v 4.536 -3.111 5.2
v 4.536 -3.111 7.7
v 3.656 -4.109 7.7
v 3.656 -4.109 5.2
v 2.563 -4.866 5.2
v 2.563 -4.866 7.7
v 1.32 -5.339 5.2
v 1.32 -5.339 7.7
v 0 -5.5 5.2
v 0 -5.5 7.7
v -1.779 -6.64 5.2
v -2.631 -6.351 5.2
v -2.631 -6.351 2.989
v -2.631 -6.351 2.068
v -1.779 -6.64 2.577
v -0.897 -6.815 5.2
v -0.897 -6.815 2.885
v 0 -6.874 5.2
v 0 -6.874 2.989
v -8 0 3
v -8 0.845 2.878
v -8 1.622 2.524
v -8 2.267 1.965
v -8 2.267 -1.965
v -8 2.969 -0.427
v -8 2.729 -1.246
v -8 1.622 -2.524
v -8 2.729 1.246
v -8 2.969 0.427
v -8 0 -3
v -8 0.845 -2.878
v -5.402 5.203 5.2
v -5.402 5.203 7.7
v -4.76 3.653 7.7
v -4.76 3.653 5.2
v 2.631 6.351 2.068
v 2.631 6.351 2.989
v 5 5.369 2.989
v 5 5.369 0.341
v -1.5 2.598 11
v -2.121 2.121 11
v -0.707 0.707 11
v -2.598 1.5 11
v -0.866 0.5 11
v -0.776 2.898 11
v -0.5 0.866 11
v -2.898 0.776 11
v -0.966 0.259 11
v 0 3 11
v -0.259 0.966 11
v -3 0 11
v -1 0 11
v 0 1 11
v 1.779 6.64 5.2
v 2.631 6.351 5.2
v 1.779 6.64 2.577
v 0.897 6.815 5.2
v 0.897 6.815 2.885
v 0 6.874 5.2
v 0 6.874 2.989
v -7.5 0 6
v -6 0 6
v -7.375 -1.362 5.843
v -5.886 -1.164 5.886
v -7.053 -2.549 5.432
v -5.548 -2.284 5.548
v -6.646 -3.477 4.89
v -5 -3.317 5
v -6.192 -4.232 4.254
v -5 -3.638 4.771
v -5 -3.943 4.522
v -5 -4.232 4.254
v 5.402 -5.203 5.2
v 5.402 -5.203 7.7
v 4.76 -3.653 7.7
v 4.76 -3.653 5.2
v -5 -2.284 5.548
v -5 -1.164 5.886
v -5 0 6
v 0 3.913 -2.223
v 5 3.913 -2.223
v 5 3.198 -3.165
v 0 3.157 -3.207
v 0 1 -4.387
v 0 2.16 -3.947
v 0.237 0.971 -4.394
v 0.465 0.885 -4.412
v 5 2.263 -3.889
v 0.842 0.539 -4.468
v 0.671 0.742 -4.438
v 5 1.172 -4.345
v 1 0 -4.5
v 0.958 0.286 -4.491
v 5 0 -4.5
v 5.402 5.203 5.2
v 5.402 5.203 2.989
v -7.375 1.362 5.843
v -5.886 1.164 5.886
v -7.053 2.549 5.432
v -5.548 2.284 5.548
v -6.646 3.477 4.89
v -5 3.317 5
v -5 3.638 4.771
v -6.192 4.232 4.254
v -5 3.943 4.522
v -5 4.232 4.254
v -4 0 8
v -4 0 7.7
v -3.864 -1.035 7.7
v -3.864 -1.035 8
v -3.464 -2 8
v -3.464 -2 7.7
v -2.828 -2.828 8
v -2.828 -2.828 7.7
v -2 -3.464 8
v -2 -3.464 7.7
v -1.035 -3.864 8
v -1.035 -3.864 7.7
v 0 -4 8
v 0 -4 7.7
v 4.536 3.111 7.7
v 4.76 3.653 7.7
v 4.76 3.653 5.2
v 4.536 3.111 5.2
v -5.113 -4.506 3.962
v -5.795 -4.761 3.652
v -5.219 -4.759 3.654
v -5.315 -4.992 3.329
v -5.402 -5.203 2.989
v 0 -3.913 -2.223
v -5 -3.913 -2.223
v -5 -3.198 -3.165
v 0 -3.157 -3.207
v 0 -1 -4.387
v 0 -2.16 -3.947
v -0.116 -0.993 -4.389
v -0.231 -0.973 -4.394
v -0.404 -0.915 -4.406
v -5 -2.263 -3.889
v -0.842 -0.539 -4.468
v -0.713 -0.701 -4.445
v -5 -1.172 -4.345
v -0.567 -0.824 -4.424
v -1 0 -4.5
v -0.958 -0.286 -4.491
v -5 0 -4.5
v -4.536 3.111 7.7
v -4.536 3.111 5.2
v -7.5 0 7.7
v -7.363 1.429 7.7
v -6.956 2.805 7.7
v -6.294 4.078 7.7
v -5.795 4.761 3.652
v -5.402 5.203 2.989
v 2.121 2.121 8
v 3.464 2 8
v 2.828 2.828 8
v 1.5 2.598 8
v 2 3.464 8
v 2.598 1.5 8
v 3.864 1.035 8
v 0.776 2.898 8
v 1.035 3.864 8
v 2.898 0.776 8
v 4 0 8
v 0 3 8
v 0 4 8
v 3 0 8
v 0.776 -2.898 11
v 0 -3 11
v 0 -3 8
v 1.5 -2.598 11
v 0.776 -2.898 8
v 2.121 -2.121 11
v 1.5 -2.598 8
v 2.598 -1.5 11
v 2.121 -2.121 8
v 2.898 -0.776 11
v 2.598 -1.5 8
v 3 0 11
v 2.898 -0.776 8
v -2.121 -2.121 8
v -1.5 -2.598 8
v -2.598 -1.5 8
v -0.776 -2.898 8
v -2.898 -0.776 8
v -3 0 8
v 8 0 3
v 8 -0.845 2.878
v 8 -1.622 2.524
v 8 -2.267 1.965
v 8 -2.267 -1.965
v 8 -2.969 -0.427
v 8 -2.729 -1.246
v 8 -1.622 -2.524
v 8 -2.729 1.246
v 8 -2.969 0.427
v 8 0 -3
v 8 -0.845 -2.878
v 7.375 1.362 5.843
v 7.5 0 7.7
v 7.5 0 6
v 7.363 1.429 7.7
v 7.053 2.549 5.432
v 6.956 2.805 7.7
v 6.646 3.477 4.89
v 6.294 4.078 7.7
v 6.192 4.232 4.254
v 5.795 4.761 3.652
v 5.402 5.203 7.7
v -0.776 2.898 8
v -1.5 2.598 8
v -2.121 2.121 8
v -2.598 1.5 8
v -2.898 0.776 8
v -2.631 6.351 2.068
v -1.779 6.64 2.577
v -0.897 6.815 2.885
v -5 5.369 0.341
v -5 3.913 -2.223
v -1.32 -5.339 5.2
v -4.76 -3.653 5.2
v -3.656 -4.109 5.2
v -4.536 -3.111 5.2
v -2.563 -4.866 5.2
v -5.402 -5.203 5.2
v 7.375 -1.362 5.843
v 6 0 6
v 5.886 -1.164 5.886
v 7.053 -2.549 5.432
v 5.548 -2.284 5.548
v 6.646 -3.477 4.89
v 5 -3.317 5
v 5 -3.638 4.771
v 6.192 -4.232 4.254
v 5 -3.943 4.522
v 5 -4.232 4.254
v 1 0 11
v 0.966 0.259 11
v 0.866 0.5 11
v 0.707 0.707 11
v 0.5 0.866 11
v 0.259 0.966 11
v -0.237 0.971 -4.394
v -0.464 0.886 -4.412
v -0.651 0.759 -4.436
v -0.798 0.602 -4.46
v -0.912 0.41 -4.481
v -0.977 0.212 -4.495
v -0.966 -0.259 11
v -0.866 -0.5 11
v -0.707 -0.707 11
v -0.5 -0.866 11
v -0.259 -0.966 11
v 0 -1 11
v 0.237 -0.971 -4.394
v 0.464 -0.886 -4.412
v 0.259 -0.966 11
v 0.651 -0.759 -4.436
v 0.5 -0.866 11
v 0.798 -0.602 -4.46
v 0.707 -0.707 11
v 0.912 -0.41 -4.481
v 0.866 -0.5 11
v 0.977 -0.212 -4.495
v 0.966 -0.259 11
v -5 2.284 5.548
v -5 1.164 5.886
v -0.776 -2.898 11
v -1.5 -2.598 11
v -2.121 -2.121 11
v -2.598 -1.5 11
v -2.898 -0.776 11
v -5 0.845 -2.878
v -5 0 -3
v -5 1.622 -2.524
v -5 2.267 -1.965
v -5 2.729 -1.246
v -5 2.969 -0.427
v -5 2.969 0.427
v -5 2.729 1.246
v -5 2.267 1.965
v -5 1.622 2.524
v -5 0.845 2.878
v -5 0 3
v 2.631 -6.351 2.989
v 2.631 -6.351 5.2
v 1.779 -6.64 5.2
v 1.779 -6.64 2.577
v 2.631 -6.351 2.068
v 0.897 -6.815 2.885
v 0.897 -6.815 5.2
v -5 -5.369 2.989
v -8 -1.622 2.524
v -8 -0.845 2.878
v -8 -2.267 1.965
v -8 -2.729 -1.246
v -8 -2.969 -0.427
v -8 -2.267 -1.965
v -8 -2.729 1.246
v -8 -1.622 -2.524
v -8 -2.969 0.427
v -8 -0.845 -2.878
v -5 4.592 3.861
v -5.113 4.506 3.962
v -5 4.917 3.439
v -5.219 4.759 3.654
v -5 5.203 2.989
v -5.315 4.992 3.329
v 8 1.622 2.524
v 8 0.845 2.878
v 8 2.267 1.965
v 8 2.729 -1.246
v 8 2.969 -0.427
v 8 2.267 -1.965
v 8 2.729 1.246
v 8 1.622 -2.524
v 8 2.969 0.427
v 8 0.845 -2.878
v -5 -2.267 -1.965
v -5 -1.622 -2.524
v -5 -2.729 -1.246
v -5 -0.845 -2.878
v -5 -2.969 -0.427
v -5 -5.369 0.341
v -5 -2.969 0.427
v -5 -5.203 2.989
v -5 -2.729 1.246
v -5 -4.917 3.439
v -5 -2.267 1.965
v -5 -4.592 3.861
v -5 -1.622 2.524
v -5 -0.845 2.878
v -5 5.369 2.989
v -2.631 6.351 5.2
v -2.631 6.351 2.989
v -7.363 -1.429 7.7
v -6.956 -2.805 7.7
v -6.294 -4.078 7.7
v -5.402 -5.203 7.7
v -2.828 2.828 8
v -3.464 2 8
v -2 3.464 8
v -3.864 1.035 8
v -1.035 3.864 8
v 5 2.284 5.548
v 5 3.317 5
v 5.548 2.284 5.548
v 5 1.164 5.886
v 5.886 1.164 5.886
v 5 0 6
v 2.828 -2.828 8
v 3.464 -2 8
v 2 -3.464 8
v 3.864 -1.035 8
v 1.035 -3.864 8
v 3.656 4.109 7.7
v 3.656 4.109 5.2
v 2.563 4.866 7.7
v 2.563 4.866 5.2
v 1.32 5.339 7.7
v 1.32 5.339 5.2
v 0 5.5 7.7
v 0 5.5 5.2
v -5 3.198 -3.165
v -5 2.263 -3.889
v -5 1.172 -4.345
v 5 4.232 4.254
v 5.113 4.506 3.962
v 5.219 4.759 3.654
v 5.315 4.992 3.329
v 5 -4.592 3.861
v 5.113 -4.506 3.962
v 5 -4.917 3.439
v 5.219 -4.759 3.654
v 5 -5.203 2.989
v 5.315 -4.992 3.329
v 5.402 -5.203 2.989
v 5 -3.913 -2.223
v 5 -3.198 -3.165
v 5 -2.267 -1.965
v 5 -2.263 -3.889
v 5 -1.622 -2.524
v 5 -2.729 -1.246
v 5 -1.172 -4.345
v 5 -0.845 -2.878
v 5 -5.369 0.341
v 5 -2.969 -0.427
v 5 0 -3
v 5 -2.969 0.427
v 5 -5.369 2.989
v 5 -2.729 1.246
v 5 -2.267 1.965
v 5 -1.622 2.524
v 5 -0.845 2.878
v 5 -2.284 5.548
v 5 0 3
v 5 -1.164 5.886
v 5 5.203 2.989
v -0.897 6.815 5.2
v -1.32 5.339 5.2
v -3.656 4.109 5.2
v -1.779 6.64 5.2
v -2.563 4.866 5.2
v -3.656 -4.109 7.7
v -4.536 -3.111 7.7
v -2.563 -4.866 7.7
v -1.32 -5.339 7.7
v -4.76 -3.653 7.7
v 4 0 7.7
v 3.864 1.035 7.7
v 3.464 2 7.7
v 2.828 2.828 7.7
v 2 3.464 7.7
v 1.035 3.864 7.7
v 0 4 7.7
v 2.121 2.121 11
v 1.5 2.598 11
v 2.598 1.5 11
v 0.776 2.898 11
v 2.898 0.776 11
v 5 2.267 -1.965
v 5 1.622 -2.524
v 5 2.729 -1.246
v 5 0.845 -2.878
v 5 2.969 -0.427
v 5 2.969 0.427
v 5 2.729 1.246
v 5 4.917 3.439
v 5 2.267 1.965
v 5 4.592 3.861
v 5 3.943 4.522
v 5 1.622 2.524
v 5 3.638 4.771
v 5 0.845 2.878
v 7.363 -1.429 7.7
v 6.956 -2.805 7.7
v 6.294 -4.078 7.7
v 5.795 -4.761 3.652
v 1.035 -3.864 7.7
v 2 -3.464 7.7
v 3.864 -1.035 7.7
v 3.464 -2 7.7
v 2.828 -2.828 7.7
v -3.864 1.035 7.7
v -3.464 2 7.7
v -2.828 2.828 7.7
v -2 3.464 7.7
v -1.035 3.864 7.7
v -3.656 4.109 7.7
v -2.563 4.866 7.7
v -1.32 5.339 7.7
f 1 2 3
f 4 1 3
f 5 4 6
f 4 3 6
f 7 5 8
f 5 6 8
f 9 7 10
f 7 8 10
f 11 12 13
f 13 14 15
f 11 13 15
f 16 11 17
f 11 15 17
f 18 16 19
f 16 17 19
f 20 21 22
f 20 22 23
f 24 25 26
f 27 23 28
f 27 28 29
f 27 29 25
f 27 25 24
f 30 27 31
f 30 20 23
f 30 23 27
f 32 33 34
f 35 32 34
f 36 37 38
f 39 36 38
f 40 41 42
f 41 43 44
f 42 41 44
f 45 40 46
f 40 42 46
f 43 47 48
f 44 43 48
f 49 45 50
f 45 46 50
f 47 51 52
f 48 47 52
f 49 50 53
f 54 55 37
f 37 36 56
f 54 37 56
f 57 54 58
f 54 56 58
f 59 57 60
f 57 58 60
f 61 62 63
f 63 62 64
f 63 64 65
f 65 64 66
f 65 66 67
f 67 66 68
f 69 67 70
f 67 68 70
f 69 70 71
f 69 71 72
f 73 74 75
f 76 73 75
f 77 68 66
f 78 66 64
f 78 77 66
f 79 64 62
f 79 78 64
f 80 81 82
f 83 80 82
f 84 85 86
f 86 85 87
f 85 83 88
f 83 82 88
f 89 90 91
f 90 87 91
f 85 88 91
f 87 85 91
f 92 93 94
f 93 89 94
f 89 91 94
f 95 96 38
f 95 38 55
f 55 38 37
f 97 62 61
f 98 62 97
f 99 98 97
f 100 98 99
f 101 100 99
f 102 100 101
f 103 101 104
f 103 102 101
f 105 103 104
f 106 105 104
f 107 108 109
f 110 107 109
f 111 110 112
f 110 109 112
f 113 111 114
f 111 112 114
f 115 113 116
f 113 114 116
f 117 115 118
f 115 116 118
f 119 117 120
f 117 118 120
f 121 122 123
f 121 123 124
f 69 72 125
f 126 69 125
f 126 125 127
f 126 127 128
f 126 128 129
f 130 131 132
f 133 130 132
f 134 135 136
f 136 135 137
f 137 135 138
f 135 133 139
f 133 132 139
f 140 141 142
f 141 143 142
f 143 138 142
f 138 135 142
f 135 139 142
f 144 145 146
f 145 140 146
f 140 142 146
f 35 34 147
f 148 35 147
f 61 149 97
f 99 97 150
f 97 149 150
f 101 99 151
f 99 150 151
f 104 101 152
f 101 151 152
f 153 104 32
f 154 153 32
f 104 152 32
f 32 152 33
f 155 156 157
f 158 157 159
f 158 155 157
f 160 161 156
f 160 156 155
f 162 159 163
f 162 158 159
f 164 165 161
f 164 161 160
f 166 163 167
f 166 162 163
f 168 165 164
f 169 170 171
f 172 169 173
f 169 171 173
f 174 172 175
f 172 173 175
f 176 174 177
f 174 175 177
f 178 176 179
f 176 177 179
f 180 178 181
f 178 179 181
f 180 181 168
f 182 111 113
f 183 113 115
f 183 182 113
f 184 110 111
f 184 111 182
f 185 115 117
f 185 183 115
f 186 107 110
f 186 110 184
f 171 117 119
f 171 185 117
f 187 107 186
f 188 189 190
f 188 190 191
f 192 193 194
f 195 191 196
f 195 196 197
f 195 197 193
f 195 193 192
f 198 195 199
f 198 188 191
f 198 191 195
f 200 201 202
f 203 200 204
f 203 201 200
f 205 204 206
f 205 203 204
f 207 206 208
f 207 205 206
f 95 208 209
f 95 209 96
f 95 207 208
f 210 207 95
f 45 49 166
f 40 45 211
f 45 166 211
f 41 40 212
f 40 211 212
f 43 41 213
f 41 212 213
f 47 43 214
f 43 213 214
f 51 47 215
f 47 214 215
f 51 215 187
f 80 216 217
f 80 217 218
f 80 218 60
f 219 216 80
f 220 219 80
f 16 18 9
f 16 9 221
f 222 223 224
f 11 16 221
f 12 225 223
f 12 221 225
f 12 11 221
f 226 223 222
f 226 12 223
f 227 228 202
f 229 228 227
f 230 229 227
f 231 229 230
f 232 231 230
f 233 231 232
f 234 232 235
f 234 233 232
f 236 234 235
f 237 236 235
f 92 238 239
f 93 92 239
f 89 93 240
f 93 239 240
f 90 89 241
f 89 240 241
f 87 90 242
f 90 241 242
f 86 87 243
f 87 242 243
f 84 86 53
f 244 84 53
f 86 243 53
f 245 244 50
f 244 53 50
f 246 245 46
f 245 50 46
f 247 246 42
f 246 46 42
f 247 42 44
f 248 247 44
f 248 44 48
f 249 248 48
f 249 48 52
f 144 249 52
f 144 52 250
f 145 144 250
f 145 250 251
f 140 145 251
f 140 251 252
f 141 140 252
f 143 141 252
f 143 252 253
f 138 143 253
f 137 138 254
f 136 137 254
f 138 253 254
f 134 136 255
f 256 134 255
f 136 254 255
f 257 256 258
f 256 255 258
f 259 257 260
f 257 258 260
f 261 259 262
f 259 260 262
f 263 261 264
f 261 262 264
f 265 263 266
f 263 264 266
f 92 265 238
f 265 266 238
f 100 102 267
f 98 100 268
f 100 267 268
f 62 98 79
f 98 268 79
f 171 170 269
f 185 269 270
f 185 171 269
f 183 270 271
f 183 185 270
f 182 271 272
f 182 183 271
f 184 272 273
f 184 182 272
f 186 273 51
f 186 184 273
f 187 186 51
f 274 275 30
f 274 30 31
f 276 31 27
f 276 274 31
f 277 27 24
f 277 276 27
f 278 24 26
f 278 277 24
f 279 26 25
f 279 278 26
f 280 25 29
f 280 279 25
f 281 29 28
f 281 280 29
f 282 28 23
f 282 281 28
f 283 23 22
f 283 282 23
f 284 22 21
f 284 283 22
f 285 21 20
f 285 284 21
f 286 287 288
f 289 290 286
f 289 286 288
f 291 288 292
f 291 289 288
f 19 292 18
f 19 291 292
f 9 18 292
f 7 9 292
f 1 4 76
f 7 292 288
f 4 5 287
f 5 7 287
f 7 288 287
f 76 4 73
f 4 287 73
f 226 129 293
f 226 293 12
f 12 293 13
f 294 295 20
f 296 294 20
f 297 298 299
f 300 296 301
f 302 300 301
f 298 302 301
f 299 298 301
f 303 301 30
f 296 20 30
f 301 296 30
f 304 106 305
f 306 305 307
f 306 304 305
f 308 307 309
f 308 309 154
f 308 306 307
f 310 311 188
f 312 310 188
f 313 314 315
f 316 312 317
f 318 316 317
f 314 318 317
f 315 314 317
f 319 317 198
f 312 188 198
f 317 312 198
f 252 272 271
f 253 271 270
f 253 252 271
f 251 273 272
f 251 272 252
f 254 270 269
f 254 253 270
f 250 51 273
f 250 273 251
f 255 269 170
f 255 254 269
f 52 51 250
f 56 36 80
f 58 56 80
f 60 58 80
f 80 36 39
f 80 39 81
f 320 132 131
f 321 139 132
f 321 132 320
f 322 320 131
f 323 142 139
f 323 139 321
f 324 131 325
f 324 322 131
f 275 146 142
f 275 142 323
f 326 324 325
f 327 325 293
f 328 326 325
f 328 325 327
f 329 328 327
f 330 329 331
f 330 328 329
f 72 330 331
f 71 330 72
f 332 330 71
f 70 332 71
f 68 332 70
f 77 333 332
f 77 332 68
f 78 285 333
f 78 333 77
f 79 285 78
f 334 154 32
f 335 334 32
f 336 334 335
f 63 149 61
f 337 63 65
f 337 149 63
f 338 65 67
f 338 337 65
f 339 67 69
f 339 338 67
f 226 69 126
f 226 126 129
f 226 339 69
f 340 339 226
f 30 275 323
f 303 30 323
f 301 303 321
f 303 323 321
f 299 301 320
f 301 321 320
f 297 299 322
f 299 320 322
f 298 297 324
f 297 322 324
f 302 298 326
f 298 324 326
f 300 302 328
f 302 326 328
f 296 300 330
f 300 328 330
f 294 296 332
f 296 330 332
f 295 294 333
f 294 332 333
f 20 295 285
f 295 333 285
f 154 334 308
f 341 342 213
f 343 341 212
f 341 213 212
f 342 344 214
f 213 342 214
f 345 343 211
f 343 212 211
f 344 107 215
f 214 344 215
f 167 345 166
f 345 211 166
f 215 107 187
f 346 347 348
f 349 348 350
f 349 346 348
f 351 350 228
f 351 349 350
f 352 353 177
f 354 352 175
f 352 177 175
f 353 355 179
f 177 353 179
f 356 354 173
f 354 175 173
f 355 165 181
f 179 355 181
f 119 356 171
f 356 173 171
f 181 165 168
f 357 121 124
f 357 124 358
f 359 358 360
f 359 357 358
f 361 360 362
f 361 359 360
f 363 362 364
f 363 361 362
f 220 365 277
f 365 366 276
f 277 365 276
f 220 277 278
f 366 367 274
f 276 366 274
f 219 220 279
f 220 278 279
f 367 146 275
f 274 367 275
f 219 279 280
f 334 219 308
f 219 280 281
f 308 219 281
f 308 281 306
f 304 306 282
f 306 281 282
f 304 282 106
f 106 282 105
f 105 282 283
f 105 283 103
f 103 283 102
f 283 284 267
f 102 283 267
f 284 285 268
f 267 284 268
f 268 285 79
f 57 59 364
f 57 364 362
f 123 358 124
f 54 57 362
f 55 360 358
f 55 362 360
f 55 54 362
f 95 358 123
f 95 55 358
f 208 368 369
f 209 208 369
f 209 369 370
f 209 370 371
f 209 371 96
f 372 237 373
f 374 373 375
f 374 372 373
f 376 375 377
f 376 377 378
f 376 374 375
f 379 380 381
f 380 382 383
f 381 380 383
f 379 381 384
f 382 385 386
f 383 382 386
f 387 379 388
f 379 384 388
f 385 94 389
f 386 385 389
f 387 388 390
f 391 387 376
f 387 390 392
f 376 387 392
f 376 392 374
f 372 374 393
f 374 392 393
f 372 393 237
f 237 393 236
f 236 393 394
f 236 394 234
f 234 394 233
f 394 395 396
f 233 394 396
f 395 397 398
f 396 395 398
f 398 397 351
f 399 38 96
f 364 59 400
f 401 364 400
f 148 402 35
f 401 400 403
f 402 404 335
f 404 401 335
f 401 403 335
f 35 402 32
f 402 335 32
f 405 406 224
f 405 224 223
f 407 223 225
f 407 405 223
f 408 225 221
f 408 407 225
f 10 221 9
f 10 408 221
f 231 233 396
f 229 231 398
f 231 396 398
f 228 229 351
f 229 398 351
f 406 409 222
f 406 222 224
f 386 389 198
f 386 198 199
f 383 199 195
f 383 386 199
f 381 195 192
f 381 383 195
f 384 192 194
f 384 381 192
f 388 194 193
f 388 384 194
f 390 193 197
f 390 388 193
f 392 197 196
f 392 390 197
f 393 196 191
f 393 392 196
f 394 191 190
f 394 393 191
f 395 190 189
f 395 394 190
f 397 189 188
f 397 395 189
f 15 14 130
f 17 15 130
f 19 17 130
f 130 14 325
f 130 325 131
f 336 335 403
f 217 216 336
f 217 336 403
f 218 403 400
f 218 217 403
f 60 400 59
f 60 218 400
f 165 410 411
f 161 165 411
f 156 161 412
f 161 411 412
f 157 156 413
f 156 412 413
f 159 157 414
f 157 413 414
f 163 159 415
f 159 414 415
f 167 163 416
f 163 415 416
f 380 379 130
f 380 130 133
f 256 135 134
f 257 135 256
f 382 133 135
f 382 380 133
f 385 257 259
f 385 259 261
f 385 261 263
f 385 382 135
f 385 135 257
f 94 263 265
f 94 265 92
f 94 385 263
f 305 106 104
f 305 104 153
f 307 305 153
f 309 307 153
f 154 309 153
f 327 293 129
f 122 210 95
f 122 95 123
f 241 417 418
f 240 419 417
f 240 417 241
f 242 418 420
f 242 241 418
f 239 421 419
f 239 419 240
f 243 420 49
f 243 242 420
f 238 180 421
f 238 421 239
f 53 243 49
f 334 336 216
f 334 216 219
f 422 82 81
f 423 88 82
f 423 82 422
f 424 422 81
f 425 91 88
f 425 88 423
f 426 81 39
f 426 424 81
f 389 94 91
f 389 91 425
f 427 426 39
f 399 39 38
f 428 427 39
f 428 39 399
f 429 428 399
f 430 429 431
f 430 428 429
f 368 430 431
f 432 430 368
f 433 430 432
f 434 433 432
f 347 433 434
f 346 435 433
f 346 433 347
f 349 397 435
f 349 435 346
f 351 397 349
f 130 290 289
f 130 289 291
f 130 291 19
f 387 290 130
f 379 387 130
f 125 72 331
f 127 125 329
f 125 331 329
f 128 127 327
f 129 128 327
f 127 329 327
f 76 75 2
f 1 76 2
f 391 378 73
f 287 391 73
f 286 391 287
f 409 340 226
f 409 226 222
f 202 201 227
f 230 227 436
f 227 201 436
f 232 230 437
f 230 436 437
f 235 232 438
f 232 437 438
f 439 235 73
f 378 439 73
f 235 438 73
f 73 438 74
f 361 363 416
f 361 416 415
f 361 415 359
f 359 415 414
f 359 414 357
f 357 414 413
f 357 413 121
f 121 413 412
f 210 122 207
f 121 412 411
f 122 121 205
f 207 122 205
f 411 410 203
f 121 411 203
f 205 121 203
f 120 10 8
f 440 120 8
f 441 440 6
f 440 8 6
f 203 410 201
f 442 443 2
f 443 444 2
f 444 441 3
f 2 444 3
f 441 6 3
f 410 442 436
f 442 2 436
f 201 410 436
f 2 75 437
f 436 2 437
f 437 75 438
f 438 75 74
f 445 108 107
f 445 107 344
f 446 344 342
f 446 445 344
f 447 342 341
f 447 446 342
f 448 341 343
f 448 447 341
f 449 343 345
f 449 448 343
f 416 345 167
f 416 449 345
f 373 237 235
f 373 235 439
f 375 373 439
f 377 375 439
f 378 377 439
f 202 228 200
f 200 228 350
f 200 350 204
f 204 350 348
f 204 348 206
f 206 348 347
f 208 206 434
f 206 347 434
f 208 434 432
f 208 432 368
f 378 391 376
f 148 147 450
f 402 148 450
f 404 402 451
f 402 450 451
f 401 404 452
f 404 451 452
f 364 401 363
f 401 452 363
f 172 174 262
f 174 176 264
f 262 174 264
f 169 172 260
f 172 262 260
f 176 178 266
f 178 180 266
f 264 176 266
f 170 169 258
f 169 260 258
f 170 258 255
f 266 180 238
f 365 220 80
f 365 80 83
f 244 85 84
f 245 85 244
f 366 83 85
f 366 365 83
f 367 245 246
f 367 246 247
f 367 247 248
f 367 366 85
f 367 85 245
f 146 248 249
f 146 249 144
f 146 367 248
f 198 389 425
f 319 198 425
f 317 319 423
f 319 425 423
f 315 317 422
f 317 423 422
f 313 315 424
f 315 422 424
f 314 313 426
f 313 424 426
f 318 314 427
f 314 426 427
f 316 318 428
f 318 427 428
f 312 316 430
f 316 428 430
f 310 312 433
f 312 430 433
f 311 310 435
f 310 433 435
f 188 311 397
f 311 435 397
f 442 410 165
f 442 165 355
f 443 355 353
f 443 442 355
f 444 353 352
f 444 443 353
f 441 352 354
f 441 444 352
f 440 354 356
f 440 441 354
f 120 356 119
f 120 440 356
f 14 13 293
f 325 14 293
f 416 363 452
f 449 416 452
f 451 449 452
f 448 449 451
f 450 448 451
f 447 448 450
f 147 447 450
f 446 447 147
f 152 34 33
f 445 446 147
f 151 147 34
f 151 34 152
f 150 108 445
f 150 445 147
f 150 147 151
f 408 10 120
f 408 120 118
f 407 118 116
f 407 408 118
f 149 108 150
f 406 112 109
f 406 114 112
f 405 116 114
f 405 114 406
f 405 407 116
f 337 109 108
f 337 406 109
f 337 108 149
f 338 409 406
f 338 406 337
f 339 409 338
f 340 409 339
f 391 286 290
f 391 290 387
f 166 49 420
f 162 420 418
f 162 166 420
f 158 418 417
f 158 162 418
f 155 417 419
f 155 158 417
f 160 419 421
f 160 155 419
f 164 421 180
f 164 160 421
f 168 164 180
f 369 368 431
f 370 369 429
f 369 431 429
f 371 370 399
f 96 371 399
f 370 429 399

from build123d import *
from build123d.topology import SkipClean

# Parameters (mm, degrees)
SKETCH1_R                = 6
BOSS_EXTRUDE1_DEPTH      = 11
SKETCH2_R                = 6
BOSS_EXTRUDE2_DEPTH      = 8
CUT_EXTRUDE1_DEPTH       = 10
CUT_EXTRUDE1_DEPTH_BACK  = 3
SKETCH3_R                = 6
SKETCH3_R_2              = 3
SKETCH5_W                = 8.868099488
SKETCH5_H                = 25.092164851
CUT_EXTRUDE3_DEPTH       = 20.723082923
CUT_EXTRUDE2_START       = -3.3
CUT_EXTRUDE2_DEPTH       = 3.3
CUT_EXTRUDE5_DEPTH       = 2.5
BOSS_EXTRUDE3_REACH      = 18.961
BOSS_EXTRUDE3_END_RADIUS = 6
BOSS_EXTRUDE4_START      = -2.211146
BOSS_EXTRUDE4_DEPTH      = 2.211146
SKETCH10_R               = 3
CUT_EXTRUDE6_DEPTH       = 19.364367672
SKETCH12_R               = 4
SKETCH12_R_2             = 3
BOSS_EXTRUDE5_DEPTH      = 0.3
BOSS_EXTRUDE6_START      = -5
BOSS_EXTRUDE6_DEPTH      = 10
CUT_EXTRUDE12_DEPTH      = 19.364367672
CUT_EXTRUDE9_DEPTH       = 14.244940814
SKETCH15_OUTSIDE_W       = 23.236
SKETCH15_OUTSIDE_H       = 20.984
SKETCH15_OUTSIDE_W_2     = 17.302035992
SKETCH15_OUTSIDE_H_2     = 16.797371099
CUT_EXTRUDE10_DEPTH      = 19.748333259
SKETCH16_R               = 1
CUT_EXTRUDE11_DEPTH      = 19.748333259


with BuildPart() as part:
    # Sketch1 → Boss-Extrude1 (new body)
    with BuildSketch(Plane.XY):
        Circle(SKETCH1_R)
    extrude(amount=BOSS_EXTRUDE1_DEPTH)

    # Sketch2 → Boss-Extrude2 (add, symmetric)
    with BuildSketch(Plane(origin=(0, 0, 0), x_dir=(0, 0, -1), z_dir=(1, 0, 0))):
        Circle(SKETCH2_R)
    extrude(amount=BOSS_EXTRUDE2_DEPTH, both=True)

    # Sketch3 → Cut-Extrude1 (cut, two sides: drawn at the far end of the back side and taken through both)
    with BuildSketch(Plane.ZY.offset(8).offset(-CUT_EXTRUDE1_DEPTH_BACK)):
        with Locations(Location((0, 0, 0), (0, 0, 33.557309762))):
            Circle(SKETCH3_R)
        with Locations(Location((0, 0, 0), (0, 0, 180))):
            Circle(SKETCH3_R_2, mode=Mode.SUBTRACT)
    extrude(amount=CUT_EXTRUDE1_DEPTH + CUT_EXTRUDE1_DEPTH_BACK, mode=Mode.SUBTRACT)

    # Sketch5 → Cut-Extrude3 (cut, through all)
    with BuildSketch(Plane.XY.offset(11)):
        with Locations((4.434049744, 3.885168382)):
            Rectangle(SKETCH5_W, SKETCH5_H)
    extrude(amount=-CUT_EXTRUDE3_DEPTH, mode=Mode.SUBTRACT)

    # Sketch4 → Cut-Extrude2 (cut)
    with BuildSketch(Plane.XY.offset(11).offset(CUT_EXTRUDE2_START)):
        with BuildLine():
            Line((0, 3), (0, 6))
            ThreePointArc((0, 6), (-6, 0), (0, -6))
            Line((0, -6), (0, -3))
            ThreePointArc((0, -3), (-3, 0), (0, 3))
        make_face()
    extrude(amount=CUT_EXTRUDE2_DEPTH, mode=Mode.SUBTRACT)

    # Mirror1: part across plane


with BuildPart() as part_1:
    with SkipClean():  # the faces are left unmerged after this step: merging them gives an invalid solid
        add(part.part)
        add(part.part.mirror(Plane(origin=(0, -8.660914044, -6), x_dir=(0, 0, 1), z_dir=(-1, 0, 0))))

    # Sketch7 → Cut-Extrude5 (cut)
    with BuildSketch(Plane.XY.offset(7.7)):
        with BuildLine():
            Line((-4.535722056, 3.110823914), (-5.732457975, 6))
            Line((-5.732457975, 6), (5.732457975, 6))
            Line((5.732457975, 6), (4.535722056, 3.110823914))
            ThreePointArc((4.535722056, 3.110823914), (0, 5.5), (-4.535722056, 3.110823914))
        make_face()
        with BuildLine():
            Line((4.535722056, -3.110823914), (5.732457975, -6))
            Line((5.732457975, -6), (-5.732457975, -6))
            Line((-5.732457975, -6), (-4.535722056, -3.110823914))
            ThreePointArc((-4.535722056, -3.110823914), (0, -5.5), (4.535722056, -3.110823914))
        make_face()
    extrude(amount=-CUT_EXTRUDE5_DEPTH, mode=Mode.SUBTRACT)

    # Boss-Extrude3: up to this cylinder (the profile starts outside it)
    with SkipClean():  # the faces are left unmerged after this step: merging them gives an invalid solid
        boss_extrude3_end = Plane(origin=(0, 0, 0), z_dir=(1, 0, 0)) * Cylinder(BOSS_EXTRUDE3_END_RADIUS, 63.367438, mode=Mode.PRIVATE)
        # Sketch8 → Boss-Extrude3 (add, up to the surface)
        with BuildSketch(Plane.XY.offset(7.7), mode=Mode.PRIVATE) as boss_extrude3_sk1:
            with BuildLine():
                Line((4.760120042, 3.652568574), (5.402152292, 5.202571539))
                ThreePointArc((5.402152292, 5.202571539), (7.5, 0), (5.402152292, -5.202571539))
                Line((5.402152292, -5.202571539), (4.760120042, -3.652568574))
                ThreePointArc((4.760120042, -3.652568574), (6, 0), (4.760120042, 3.652568574))
            make_face()
        boss_extrude3_tool1 = extrude(boss_extrude3_sk1.sketch, amount=-BOSS_EXTRUDE3_REACH, mode=Mode.PRIVATE) - boss_extrude3_end
        add(boss_extrude3_tool1.solids().sort_by_distance((6.222719, 0, 7.7))[0])
        # Sketch8 → Boss-Extrude3 (add, up to the surface)
        with BuildSketch(Plane.XY.offset(7.7), mode=Mode.PRIVATE) as boss_extrude3_sk2:
            with BuildLine():
                Line((-4.760120042, 3.652568574), (-5.402152292, 5.202571539))
                ThreePointArc((-5.402152292, 5.202571539), (-7.5, 0), (-5.402152292, -5.202571539))
                Line((-5.402152292, -5.202571539), (-4.760120042, -3.652568574))
                ThreePointArc((-4.760120042, -3.652568574), (-6, 0), (-4.760120042, 3.652568574))
            make_face()
        boss_extrude3_tool2 = extrude(boss_extrude3_sk2.sketch, amount=-BOSS_EXTRUDE3_REACH, mode=Mode.PRIVATE) - boss_extrude3_end
        add(boss_extrude3_tool2.solids().sort_by_distance((-6.222719, 0, 7.7))[0])

    # Sketch9 → Boss-Extrude4 (add)
    with SkipClean():  # the faces are left unmerged after this step: merging them gives an invalid solid
        with BuildSketch(Plane.XY.offset(5.2).offset(BOSS_EXTRUDE4_START)):
            with BuildLine():
                Line((2.630513694, 6.350621836), (5.402152292, 5.202571539))
                Line((5.402152292, 5.202571539), (4.760120042, 3.652568574))
                ThreePointArc((4.760120042, 3.652568574), (0, 6), (-4.760120042, 3.652568574))
                Line((-4.760120042, 3.652568574), (-5.402152292, 5.202571539))
                Line((-5.402152292, 5.202571539), (-2.630513694, 6.350621836))
                ThreePointArc((-2.630513694, 6.350621836), (0, 6.873863542), (2.630513694, 6.350621836))
            make_face()
        extrude(amount=BOSS_EXTRUDE4_DEPTH)

    # Sketch10 → Cut-Extrude6 (cut, through all)
    with SkipClean():  # the faces are left unmerged after this step: merging them gives an invalid solid
        with BuildSketch(Plane.ZY.offset(5)):
            with BuildLine():
                ThreePointArc((2.988854192, 5.202571539), (-5.94680377, -0.79719817), (4.25356316, -4.231690023))
                ThreePointArc((4.25356316, -4.231690023), (5.94680377, 0.79719817), (2.988854192, 5.202571539))
            make_face()
            with Locations(Location((0, 0, 0), (0, 0, 180))):
                Circle(SKETCH10_R, mode=Mode.SUBTRACT)
        extrude(amount=CUT_EXTRUDE6_DEPTH, mode=Mode.SUBTRACT)

    # Mirror2: part across plane


with BuildPart() as part_2:
    add(part_1.part)
    add(part_1.part.mirror(Plane.ZX))

    # Sketch12 → Boss-Extrude5 (add)
    with BuildSketch(Plane.XY.offset(7.7)):
        Circle(SKETCH12_R)
        Circle(SKETCH12_R_2, mode=Mode.SUBTRACT)
    extrude(amount=BOSS_EXTRUDE5_DEPTH)

    # Sketch13 → Boss-Extrude6 (add)
    with BuildSketch(Plane(origin=(0, 0, 0), x_dir=(0, 0, -1), z_dir=(1, 0, 0)).offset(BOSS_EXTRUDE6_START)):
        with BuildLine():
            Line((-2.988854192, -6.873863542), (-2.988854192, -5.202571539))
            ThreePointArc((-2.988854192, -5.202571539), (-0.863689726, -5.937511268), (1.38278621, -5.838484589))
            Line((1.38278621, -5.838484589), (-2.988854192, -6.873863542))
        make_face()
        with BuildLine():
            Line((-2.988854192, 5.202571539), (-2.988854192, 6.873863542))
            Line((-2.988854192, 6.873863542), (1.38278621, 5.838484589))
            ThreePointArc((1.38278621, 5.838484589), (-0.863689726, 5.937511268), (-2.988854192, 5.202571539))
        make_face()
    extrude(amount=BOSS_EXTRUDE6_DEPTH)

    # Sketch17 → Cut-Extrude12 (cut, through all)
    with BuildSketch(Plane.ZY.offset(5)):
        with BuildLine():
            Line((2.988854192, -6.873863542), (-2.223044712, -3.912553157))
            ThreePointArc((-2.223044712, -3.912553157), (-4.5, 0), (-2.223044712, 3.912553157))
            Line((-2.223044712, 3.912553157), (2.988854192, 6.873863542))
            Line((2.988854192, 6.873863542), (-1.38278621, 5.838484589))
            ThreePointArc((-1.38278621, 5.838484589), (-6, 0), (-1.38278621, -5.838484589))
            Line((-1.38278621, -5.838484589), (2.988854192, -6.873863542))
        make_face()
    extrude(amount=-CUT_EXTRUDE12_DEPTH, mode=Mode.SUBTRACT)

    # Sketch14 → Cut-Extrude9 (cut, through all)
    with BuildSketch(Plane(origin=(0, 0, 2.988854192), x_dir=(-1, 0, 0), z_dir=(0, 0, -1))):
        with BuildLine():
            Line((5, -16.873863542), (-5, -16.873863542))
            Line((-5, -16.873863542), (-5, -5.369148472))
            Line((-5, -5.369148472), (-2.630513694, -6.350621836))
            ThreePointArc((-2.630513694, -6.350621836), (-1.341024252, -6.741784182), (0, -6.873863542))
            ThreePointArc((0, -6.873863542), (1.341024252, -6.741784182), (2.630513694, -6.350621836))
            Line((2.630513694, -6.350621836), (5, -5.369148472))
            Line((5, -5.369148472), (5, -16.873863542))
        make_face()
    extrude(amount=CUT_EXTRUDE9_DEPTH, mode=Mode.SUBTRACT)

    # Sketch15 outside → Cut-Extrude10 (cut, through all)
    with SkipClean():  # the faces are left unmerged after this step: merging them gives an invalid solid
        with BuildSketch(Plane.XY.offset(11)):
            Rectangle(SKETCH15_OUTSIDE_W, SKETCH15_OUTSIDE_H)
            with Locations((-8.651017996, -8.398685549)):
                Rectangle(SKETCH15_OUTSIDE_W_2, SKETCH15_OUTSIDE_H_2, mode=Mode.SUBTRACT)
        extrude(amount=-CUT_EXTRUDE10_DEPTH, mode=Mode.SUBTRACT)

    # Mirror3: part across plane


with BuildPart() as part_3:
    add(part_2.part)
    add(part_2.part.mirror(Plane(origin=(0, 0, -4.5), x_dir=(0, 0, 1), z_dir=(0, 1, 0))))

    # Mirror4: part across face


with BuildPart() as part_4:
    with SkipClean():  # the faces are left unmerged after this step: merging them gives an invalid solid
        add(part_3.part)
        add(part_3.part.mirror(Plane(origin=(0, 0, 3.307079487), x_dir=(0, 0, 1), z_dir=(1, 0, 0))))

    # Sketch16 → Cut-Extrude11 (cut, through all)
    with SkipClean():  # the faces are left unmerged after this step: merging them gives an invalid solid
        with BuildSketch(Plane.XY.offset(11)):
            Circle(SKETCH16_R)
        extrude(amount=-CUT_EXTRUDE11_DEPTH, mode=Mode.SUBTRACT)


solid = part_4.part
